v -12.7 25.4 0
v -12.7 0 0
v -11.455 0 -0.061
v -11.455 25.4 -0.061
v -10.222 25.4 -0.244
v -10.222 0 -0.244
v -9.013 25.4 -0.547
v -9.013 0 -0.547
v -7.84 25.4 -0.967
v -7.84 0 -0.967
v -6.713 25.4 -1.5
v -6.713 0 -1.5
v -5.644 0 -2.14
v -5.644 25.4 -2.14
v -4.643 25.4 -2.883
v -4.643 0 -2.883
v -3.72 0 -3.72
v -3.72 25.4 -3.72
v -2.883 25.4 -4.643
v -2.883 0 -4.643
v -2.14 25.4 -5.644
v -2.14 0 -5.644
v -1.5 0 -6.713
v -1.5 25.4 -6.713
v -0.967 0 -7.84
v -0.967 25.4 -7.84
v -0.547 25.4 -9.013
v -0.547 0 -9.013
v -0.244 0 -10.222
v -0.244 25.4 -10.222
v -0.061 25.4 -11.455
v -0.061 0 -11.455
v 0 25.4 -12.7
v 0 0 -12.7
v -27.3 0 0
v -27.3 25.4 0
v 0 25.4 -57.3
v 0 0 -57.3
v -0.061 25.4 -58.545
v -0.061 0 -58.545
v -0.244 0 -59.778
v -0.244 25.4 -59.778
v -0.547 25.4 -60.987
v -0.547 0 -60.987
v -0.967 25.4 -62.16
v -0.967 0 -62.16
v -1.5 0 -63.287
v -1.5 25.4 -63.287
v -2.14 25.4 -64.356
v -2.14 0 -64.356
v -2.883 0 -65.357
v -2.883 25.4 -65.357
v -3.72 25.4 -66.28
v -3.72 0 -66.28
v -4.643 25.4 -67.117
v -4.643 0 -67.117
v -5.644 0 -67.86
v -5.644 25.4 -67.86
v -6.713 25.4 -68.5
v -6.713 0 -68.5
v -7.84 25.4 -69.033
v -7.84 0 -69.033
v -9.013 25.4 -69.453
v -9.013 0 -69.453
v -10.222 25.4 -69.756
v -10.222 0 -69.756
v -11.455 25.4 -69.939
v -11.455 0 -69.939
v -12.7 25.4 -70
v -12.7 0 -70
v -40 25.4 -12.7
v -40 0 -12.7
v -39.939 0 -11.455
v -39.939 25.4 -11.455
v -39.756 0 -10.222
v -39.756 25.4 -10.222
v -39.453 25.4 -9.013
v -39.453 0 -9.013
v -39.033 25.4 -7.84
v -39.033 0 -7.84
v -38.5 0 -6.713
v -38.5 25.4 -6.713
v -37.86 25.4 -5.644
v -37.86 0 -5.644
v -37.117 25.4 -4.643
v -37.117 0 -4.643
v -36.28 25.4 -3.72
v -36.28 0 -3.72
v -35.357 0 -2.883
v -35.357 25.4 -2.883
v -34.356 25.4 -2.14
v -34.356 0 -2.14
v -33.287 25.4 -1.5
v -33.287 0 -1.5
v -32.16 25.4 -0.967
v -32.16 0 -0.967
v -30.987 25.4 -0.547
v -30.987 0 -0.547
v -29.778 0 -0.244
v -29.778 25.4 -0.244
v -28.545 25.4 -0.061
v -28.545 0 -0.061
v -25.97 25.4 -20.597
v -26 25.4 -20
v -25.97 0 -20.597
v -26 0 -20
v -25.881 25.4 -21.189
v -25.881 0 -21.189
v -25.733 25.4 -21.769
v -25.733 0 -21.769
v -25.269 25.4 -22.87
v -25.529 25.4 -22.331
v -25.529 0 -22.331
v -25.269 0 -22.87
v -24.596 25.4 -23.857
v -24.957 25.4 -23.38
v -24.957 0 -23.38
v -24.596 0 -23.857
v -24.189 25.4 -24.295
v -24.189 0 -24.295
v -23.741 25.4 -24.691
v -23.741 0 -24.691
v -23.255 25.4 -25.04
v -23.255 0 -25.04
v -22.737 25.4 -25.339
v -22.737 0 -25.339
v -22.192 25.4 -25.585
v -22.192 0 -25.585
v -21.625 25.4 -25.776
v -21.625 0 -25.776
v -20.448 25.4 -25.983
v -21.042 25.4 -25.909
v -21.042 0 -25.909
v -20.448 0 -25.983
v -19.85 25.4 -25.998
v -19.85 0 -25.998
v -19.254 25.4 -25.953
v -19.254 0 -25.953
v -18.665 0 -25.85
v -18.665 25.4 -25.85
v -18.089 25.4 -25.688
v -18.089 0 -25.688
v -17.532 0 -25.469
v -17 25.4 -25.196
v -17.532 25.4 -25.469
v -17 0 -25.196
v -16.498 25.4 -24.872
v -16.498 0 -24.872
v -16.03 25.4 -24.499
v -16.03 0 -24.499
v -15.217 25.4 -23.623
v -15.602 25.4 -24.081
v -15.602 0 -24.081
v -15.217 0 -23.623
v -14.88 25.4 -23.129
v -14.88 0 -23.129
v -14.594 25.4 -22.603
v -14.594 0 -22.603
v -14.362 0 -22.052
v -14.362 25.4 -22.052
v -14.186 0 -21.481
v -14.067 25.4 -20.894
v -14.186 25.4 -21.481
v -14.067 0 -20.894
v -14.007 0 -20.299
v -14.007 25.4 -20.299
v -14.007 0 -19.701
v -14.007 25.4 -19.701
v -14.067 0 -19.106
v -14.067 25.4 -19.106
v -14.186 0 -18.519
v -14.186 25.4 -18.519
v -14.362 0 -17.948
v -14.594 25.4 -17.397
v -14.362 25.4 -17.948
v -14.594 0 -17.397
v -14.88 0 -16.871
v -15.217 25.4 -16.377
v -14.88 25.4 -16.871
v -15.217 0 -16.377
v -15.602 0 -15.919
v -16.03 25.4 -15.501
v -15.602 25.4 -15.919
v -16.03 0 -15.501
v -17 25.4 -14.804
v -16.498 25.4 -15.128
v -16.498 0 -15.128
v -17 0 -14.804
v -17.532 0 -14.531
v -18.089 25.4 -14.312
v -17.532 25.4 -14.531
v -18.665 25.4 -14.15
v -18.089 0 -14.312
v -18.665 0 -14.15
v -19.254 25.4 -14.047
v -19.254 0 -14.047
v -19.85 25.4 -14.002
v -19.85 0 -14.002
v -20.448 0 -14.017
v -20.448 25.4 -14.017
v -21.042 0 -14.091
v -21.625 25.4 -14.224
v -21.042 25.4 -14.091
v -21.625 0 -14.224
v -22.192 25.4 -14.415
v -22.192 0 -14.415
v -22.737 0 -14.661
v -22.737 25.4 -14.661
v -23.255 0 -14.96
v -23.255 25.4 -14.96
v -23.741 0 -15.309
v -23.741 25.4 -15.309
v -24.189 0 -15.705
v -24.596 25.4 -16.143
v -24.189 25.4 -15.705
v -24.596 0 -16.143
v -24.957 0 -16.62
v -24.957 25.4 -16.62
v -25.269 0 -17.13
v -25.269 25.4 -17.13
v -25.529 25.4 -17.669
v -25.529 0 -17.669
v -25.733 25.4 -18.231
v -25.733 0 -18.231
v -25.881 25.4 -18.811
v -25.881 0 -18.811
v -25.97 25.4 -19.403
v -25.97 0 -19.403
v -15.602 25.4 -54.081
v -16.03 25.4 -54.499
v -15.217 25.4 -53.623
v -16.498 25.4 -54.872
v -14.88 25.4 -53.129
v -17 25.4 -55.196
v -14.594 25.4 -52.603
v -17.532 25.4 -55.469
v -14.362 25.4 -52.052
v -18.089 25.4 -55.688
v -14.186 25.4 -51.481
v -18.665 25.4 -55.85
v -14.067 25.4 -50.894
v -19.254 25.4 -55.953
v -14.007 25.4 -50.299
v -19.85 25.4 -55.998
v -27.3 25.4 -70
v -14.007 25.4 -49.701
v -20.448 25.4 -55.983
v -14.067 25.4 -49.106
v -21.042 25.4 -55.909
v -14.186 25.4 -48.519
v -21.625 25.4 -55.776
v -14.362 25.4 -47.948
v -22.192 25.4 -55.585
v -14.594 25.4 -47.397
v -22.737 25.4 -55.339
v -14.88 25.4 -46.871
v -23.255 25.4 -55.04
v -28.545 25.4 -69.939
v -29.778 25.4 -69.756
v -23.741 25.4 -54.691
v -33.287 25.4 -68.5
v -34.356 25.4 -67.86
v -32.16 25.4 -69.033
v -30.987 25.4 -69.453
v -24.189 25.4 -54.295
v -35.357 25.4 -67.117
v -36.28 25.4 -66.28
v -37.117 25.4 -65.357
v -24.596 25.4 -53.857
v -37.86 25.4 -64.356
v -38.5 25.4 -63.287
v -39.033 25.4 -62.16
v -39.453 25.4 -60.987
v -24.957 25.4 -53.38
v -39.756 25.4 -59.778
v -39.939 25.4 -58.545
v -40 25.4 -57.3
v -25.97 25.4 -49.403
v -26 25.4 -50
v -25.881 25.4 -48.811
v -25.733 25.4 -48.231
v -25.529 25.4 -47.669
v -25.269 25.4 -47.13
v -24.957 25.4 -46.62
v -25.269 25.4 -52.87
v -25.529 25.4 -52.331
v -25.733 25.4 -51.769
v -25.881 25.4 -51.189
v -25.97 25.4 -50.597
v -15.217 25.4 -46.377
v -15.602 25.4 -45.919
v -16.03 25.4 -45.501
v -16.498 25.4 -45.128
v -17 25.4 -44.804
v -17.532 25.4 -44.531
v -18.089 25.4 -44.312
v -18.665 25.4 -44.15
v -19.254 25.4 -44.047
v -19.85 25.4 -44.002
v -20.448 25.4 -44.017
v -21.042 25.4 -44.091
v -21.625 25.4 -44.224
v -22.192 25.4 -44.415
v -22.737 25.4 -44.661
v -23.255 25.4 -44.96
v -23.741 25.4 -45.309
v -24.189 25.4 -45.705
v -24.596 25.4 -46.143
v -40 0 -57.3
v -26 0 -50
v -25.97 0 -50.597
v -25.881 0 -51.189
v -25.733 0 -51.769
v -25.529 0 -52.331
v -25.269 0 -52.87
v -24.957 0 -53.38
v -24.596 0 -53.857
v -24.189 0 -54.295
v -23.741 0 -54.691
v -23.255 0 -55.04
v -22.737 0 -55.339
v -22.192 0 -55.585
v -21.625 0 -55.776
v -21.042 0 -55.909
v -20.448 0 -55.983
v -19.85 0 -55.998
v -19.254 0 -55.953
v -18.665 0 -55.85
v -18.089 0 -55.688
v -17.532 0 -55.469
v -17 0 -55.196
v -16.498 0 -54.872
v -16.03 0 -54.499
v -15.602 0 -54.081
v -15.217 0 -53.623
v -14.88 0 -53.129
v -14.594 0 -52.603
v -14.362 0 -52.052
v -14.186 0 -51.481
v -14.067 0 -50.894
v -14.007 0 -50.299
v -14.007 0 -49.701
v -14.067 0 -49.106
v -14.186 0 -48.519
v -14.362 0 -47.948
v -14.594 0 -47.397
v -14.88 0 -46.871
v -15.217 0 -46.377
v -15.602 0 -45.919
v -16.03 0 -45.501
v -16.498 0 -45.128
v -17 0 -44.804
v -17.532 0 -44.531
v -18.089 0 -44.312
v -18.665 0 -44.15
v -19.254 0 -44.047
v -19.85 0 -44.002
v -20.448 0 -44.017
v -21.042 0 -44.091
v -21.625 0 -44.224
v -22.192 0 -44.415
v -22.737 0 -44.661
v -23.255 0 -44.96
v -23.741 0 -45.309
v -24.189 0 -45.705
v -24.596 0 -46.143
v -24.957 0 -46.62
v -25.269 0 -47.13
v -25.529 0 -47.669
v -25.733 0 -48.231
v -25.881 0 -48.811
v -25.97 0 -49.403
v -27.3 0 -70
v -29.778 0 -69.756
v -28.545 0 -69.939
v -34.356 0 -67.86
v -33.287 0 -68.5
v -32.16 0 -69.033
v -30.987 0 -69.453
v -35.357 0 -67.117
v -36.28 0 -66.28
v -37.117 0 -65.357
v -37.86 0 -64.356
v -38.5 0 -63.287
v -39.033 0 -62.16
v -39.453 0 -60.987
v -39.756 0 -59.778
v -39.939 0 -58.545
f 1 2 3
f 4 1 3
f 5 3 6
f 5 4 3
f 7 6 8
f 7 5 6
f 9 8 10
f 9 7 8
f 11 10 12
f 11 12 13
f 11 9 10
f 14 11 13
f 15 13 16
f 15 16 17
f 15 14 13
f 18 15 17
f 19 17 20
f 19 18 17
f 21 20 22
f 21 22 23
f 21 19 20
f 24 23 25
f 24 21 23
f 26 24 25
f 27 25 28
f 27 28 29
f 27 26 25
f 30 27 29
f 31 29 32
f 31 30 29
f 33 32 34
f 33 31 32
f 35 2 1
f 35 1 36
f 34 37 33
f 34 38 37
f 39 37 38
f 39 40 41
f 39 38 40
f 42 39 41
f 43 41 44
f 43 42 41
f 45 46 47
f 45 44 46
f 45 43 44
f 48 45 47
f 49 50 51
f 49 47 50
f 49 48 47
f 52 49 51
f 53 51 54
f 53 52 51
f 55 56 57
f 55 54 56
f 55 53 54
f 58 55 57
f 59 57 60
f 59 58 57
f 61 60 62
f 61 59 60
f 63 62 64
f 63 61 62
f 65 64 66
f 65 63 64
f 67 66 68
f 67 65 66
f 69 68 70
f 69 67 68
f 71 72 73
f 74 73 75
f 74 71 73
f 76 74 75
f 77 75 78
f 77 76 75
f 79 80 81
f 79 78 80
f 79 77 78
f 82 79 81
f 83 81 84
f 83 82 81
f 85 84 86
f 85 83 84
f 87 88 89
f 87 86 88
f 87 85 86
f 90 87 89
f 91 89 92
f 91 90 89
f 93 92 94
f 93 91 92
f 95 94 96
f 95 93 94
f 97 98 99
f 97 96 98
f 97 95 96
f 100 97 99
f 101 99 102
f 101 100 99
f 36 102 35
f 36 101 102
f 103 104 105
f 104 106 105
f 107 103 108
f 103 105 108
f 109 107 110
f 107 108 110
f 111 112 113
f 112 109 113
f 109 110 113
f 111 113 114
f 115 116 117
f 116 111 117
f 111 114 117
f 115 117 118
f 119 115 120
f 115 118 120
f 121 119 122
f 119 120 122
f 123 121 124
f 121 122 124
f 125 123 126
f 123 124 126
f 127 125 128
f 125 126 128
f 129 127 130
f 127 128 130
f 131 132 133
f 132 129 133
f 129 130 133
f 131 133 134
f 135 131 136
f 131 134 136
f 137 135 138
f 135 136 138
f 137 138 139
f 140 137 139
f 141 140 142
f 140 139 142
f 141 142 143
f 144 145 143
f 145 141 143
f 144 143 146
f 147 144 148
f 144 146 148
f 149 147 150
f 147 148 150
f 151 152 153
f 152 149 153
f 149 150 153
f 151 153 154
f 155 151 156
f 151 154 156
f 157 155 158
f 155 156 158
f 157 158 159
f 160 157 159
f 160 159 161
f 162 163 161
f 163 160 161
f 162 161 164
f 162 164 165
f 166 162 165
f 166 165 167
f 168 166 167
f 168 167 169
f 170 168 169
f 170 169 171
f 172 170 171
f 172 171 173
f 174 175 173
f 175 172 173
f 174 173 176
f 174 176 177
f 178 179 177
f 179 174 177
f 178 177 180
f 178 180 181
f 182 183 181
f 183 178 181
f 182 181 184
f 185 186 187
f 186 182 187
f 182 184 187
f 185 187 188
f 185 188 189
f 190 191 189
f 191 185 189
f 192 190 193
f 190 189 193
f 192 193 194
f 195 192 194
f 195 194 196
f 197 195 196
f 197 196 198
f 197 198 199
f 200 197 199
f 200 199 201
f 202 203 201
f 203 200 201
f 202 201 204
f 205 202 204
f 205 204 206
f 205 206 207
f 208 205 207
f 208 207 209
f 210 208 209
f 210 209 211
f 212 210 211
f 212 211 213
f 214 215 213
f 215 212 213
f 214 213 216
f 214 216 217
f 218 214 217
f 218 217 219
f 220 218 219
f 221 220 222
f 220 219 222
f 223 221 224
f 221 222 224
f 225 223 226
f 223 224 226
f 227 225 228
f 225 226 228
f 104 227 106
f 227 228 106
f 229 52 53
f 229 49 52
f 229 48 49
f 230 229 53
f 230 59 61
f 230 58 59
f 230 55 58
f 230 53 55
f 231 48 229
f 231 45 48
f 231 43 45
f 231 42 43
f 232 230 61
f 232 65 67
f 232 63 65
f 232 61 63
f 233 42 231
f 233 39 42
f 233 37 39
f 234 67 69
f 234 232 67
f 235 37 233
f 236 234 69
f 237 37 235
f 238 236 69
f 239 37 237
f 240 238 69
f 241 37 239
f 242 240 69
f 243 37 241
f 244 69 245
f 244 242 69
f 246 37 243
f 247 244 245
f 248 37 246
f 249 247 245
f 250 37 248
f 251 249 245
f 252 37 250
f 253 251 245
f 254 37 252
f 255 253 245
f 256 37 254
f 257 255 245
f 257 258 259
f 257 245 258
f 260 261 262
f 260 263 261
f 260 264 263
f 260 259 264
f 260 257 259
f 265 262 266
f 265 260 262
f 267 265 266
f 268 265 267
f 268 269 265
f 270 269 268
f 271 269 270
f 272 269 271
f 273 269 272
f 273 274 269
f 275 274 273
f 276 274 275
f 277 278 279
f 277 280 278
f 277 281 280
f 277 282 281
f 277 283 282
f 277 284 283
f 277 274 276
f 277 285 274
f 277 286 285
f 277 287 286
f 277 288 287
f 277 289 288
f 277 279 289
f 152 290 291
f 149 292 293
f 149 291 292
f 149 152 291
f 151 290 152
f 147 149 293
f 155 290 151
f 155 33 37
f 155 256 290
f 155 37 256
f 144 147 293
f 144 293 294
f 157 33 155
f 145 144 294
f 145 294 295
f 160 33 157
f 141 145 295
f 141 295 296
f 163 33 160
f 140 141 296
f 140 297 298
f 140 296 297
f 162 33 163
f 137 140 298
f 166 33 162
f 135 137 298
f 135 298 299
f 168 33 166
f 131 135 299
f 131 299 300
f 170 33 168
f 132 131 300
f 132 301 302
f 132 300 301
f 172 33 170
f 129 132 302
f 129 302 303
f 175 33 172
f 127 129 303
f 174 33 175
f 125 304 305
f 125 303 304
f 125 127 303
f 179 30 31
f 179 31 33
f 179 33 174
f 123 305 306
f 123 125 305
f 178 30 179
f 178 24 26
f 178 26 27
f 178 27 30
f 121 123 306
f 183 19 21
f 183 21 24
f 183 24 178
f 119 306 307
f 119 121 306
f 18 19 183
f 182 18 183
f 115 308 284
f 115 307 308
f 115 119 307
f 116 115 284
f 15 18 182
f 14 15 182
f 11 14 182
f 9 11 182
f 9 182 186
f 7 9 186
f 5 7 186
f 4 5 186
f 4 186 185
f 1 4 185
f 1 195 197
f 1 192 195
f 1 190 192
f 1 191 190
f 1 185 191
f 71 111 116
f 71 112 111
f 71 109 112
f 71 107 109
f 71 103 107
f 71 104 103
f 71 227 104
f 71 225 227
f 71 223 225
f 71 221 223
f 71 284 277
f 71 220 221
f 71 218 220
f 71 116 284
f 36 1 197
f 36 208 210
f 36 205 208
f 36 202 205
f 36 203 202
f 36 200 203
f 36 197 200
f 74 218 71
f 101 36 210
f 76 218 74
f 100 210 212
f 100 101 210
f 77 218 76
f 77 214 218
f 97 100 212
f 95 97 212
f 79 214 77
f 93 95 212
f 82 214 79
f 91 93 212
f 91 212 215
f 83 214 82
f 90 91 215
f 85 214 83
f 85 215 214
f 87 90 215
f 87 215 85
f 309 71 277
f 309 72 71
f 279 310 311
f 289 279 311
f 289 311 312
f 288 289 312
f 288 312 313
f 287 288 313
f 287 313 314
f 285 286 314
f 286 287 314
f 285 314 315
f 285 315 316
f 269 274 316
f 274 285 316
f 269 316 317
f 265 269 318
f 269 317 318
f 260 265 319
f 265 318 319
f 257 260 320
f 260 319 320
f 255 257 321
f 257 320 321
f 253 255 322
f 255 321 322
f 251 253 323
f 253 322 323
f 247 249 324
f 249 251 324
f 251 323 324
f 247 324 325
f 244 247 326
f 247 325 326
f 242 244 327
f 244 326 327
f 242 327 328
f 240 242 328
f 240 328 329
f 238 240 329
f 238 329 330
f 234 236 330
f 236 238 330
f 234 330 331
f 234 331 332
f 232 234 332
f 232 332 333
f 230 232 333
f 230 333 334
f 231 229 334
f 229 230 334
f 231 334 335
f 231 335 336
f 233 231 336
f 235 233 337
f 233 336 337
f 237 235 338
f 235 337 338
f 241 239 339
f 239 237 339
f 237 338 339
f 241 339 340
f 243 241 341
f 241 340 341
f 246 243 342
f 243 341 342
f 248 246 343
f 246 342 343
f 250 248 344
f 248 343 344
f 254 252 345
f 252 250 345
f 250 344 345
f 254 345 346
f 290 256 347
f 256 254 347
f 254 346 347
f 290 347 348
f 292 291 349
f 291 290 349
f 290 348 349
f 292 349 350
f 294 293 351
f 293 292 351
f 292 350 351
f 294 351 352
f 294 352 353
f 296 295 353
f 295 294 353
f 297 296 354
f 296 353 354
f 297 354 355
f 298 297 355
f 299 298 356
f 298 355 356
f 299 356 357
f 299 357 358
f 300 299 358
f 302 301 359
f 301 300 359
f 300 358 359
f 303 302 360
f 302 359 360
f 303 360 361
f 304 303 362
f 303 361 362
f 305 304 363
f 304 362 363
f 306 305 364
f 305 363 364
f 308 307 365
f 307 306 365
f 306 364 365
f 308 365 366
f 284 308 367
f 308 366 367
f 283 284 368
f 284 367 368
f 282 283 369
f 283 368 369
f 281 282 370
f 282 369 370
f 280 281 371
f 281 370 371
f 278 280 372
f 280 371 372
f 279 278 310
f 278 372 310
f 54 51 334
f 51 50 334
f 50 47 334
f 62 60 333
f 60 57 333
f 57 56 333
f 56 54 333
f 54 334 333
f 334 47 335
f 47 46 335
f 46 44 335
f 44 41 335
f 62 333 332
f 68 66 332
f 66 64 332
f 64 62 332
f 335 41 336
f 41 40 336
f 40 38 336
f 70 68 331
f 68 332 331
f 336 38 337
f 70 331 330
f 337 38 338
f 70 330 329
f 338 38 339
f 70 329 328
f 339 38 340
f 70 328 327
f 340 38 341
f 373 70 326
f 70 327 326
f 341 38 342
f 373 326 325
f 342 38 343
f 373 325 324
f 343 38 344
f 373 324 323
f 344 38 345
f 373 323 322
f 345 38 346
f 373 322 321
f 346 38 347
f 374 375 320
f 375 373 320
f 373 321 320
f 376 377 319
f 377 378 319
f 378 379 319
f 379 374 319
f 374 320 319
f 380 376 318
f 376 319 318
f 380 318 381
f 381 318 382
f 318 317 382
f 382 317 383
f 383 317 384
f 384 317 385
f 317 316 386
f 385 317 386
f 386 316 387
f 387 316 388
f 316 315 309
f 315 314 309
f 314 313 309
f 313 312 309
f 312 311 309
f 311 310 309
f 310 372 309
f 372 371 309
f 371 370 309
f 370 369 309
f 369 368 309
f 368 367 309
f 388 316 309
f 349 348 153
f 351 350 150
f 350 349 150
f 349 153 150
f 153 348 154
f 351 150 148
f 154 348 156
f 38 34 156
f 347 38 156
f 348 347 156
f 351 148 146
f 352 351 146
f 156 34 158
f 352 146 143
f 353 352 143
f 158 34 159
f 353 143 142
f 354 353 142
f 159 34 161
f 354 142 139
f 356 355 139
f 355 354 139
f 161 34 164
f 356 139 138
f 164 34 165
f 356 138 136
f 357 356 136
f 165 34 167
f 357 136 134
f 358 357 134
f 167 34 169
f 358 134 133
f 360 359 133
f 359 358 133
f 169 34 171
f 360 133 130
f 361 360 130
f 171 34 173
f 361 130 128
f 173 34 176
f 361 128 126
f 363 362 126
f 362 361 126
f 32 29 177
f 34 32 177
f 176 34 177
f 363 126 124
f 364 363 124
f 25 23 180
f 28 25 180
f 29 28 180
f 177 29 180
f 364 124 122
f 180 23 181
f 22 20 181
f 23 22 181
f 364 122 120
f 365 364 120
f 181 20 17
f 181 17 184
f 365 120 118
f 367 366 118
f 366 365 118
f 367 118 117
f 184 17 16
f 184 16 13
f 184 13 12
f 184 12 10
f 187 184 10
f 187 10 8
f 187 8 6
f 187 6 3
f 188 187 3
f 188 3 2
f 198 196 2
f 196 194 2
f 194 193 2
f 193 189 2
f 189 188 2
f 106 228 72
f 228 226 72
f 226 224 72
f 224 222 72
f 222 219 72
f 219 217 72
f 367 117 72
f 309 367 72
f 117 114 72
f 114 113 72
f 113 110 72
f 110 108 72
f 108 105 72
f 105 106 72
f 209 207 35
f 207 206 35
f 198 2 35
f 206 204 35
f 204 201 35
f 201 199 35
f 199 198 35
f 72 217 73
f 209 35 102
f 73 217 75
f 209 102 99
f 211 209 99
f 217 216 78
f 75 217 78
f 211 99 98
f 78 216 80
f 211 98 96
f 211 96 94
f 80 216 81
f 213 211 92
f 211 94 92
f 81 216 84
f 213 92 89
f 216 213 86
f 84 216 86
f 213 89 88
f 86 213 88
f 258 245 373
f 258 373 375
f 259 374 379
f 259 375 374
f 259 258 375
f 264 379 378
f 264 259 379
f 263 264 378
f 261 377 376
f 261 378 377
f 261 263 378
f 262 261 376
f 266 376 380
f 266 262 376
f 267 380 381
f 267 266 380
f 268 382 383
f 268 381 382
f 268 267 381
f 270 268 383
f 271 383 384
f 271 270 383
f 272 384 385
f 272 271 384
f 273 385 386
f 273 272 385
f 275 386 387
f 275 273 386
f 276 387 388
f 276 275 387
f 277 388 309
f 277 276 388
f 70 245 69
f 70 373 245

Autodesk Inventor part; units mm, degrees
ref_plane "YZ Plane" through (0, 0, 0) normal (1, 0, 0) x (0, 1, 0)
ref_plane "XZ Plane" through (0, 0, 0) normal (0, 1, 0) x (-1, 0, 0)
ref_plane "XY Plane" through (0, 0, 0) normal (0, 0, 1) x (1, 0, 0)
sketch "Sketch1" plane through (0, 0, 0) normal (0, 1, 0) x (-1, 0, 0)
  line L0 (0, 0) -> (40, 0)
  line L1 (40, 0) -> (40, -70)
  line L2 (40, -70) -> (0, -70)
  line L3 (0, -70) -> (0, 0)
  circle A0 centre (20, -50) radius 6
  circle A1 centre (20, -20) radius 6
  dimension "d0" = 40
  dimension "d1" = 70
  dimension "d2" = 12
  dimension "d3" = 12
  dimension "d4" = 20
  dimension "d5" = 30
extrude "Extrusion1" add sketch "Sketch1" along normal blind 25.4
fillet "Fillet1" radius 12.7 4 edges at (0, 12.7, -70) (-40, 12.7, -70) (0, 12.7, 0) (-40, 12.7, 0)
properties part number "travel_mount"
